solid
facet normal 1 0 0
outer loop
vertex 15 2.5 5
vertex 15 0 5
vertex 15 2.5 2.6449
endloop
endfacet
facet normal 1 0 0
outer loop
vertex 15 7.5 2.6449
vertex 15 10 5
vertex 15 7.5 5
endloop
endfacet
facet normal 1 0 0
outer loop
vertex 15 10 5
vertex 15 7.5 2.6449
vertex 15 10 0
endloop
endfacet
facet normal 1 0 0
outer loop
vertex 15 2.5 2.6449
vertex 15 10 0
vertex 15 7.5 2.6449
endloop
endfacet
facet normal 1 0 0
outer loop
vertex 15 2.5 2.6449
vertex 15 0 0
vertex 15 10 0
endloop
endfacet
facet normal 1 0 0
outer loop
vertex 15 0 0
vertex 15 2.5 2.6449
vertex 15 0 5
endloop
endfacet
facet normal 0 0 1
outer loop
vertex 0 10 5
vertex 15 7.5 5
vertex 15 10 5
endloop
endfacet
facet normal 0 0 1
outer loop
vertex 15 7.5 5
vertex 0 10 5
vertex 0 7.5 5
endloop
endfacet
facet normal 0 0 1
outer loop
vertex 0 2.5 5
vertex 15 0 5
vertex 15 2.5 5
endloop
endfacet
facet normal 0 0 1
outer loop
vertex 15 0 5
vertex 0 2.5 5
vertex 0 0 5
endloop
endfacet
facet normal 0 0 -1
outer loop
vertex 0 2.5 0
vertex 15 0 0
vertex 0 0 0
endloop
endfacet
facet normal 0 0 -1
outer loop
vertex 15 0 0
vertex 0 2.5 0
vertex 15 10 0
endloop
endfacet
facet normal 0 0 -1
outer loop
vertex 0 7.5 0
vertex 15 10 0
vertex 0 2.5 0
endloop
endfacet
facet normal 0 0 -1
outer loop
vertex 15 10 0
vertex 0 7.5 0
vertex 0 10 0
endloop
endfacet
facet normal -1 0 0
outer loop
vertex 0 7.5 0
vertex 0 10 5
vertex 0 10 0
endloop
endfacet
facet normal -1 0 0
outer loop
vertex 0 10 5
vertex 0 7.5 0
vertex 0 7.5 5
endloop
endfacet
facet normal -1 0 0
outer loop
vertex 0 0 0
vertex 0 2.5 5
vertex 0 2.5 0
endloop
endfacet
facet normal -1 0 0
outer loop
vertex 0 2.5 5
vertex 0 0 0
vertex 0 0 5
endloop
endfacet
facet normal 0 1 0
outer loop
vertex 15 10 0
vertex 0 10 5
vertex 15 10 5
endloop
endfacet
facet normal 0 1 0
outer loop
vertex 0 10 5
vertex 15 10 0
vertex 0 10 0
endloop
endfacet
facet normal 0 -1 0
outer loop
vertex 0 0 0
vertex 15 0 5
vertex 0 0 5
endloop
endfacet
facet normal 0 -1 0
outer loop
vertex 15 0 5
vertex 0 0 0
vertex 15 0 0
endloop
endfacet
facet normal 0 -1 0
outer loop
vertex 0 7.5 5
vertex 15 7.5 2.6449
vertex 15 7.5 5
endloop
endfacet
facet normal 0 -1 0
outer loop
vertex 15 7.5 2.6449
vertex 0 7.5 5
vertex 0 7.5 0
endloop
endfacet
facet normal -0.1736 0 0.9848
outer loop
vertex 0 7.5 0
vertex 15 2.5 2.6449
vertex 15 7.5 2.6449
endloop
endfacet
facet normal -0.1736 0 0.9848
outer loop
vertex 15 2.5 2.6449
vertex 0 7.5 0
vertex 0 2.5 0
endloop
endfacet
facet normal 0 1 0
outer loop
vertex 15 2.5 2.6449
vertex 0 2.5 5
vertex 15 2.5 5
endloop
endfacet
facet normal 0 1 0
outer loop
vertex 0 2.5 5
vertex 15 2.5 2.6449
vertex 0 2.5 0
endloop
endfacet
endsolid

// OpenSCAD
SLOT_WIDTH = 4 +1;
WIDTH = SLOT_WIDTH * 2;
LENGTH = 15;
HEIGHT = 5;


difference() {
  union() {
      cube([LENGTH, WIDTH, HEIGHT]);
  }
  
      translate([0, SLOT_WIDTH/2, 0])
      rotate([0,-10,0])
      cube([LENGTH+1, SLOT_WIDTH, HEIGHT]);

}
